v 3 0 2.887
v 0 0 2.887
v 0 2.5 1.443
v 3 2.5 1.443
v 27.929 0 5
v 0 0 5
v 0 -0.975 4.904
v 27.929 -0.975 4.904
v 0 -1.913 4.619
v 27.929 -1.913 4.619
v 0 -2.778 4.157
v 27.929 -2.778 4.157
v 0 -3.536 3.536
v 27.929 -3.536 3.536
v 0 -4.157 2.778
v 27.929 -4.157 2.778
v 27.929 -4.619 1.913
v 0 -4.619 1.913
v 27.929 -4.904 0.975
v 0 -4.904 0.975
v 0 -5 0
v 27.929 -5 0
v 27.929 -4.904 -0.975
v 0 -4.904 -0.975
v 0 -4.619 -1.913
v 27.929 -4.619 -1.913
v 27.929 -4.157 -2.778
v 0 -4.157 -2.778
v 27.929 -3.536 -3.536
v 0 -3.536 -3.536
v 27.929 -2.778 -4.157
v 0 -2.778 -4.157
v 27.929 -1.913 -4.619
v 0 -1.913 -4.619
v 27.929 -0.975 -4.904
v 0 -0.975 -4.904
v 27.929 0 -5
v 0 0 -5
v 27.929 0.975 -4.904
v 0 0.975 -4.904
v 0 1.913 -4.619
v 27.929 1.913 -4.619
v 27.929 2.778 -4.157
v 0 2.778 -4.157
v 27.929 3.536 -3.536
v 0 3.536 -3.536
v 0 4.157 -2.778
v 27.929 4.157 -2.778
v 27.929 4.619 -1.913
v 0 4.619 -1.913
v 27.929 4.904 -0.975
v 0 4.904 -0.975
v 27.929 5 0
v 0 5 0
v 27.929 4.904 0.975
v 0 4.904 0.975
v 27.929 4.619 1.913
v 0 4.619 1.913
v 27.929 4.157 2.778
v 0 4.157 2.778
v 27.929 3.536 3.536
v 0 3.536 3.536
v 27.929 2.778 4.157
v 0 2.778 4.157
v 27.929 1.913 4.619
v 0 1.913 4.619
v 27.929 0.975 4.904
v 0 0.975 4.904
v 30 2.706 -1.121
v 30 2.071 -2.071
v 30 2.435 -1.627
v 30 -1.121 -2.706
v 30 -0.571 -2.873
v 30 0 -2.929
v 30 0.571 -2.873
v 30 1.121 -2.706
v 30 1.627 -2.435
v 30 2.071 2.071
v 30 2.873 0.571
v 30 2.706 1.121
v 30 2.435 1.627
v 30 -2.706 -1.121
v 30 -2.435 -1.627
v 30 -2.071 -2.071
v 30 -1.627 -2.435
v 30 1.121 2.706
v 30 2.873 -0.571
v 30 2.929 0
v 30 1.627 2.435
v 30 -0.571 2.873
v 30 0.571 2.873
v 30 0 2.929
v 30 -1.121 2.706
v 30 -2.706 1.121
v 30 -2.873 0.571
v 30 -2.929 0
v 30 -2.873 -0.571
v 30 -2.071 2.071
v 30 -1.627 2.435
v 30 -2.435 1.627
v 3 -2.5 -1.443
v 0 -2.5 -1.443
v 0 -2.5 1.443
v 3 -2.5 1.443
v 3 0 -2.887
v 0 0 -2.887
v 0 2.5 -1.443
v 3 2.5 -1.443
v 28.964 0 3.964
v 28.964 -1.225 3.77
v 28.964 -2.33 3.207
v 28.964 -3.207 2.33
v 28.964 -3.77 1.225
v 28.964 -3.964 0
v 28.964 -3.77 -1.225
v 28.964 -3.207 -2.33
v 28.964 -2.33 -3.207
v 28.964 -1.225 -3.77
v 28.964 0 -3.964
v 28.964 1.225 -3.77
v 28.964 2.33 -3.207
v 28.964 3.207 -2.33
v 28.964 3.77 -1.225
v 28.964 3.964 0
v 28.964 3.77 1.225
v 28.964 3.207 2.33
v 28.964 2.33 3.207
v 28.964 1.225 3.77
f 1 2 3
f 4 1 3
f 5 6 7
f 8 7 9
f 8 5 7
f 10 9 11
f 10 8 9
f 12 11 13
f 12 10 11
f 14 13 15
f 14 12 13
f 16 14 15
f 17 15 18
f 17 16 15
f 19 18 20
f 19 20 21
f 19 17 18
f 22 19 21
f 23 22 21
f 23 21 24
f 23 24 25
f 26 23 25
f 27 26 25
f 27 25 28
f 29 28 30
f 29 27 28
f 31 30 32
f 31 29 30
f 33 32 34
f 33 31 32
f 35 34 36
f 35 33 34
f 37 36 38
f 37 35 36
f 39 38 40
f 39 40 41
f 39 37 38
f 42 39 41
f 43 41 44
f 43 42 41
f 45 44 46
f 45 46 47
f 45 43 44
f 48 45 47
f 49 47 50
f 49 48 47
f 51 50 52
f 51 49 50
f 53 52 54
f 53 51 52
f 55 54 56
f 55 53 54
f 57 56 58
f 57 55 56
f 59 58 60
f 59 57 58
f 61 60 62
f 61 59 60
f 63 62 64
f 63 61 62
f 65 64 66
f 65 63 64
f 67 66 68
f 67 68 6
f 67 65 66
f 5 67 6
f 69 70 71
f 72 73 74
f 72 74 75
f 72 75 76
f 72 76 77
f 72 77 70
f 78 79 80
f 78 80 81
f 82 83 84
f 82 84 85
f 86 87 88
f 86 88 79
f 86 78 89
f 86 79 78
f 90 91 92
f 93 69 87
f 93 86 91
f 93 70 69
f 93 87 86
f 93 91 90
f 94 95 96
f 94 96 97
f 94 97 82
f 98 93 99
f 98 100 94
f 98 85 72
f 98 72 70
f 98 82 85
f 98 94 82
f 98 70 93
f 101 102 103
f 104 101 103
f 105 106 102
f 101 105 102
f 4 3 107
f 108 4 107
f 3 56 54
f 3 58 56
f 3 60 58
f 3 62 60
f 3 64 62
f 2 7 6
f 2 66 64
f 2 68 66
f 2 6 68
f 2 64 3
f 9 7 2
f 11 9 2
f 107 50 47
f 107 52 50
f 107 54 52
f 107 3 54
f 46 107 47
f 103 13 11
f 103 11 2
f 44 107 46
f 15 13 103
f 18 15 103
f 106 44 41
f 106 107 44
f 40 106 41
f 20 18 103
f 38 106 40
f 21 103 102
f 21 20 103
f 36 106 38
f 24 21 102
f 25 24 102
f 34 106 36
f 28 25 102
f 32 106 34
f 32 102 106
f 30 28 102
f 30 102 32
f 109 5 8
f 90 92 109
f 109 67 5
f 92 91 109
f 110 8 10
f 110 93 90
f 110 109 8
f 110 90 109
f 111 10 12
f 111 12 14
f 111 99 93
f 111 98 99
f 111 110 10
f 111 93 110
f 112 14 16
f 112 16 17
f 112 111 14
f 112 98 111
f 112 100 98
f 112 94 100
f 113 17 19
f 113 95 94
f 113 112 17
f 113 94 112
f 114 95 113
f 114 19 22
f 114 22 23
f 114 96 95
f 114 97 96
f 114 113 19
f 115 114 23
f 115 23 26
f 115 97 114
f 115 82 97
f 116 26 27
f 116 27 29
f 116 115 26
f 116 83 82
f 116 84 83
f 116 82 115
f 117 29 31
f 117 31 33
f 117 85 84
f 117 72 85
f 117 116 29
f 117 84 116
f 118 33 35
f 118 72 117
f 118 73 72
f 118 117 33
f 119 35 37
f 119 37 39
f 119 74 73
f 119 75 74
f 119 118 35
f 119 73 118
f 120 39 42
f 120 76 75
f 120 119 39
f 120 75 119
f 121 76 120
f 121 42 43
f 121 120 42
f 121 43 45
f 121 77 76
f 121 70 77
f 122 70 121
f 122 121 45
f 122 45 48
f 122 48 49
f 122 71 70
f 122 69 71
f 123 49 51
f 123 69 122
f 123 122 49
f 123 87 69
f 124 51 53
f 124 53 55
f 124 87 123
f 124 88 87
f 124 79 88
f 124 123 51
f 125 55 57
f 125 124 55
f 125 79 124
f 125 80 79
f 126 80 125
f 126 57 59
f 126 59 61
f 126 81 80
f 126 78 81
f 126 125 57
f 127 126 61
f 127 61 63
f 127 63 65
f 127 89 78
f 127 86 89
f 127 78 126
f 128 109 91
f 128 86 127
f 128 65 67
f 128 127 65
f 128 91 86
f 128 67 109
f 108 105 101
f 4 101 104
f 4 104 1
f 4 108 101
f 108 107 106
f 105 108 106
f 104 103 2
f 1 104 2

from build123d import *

# Parameters (mm, degrees)
CUT_EXTRUDE1_DEPTH = 3


with BuildPart() as part:
    # Sketch1 → Revolve1 (revolve)
    with BuildSketch(Plane.XY, mode=Mode.PRIVATE) as revolve1_sk:
        Polygon((30, 2.928932188), (30, 0), (0, 0), (0, 5), (27.928932188, 5), align=None)
    revolve(revolve1_sk.sketch.rotate(Axis((0, 0, 0), (1, 0, 0)), 90), axis=Axis((0, 0, 0), (1, 0, 0)))

    # Sketch2 → Cut-Extrude1 (cut)
    with BuildSketch(Plane.ZY):
        Polygon((-1.443375673, 2.5), (-2.886751346, 0), (-1.443375673, -2.5), (1.443375673, -2.5), (2.886751346, 0), (1.443375673, 2.5), align=None)
    extrude(amount=-CUT_EXTRUDE1_DEPTH, mode=Mode.SUBTRACT)


solid = part.part
